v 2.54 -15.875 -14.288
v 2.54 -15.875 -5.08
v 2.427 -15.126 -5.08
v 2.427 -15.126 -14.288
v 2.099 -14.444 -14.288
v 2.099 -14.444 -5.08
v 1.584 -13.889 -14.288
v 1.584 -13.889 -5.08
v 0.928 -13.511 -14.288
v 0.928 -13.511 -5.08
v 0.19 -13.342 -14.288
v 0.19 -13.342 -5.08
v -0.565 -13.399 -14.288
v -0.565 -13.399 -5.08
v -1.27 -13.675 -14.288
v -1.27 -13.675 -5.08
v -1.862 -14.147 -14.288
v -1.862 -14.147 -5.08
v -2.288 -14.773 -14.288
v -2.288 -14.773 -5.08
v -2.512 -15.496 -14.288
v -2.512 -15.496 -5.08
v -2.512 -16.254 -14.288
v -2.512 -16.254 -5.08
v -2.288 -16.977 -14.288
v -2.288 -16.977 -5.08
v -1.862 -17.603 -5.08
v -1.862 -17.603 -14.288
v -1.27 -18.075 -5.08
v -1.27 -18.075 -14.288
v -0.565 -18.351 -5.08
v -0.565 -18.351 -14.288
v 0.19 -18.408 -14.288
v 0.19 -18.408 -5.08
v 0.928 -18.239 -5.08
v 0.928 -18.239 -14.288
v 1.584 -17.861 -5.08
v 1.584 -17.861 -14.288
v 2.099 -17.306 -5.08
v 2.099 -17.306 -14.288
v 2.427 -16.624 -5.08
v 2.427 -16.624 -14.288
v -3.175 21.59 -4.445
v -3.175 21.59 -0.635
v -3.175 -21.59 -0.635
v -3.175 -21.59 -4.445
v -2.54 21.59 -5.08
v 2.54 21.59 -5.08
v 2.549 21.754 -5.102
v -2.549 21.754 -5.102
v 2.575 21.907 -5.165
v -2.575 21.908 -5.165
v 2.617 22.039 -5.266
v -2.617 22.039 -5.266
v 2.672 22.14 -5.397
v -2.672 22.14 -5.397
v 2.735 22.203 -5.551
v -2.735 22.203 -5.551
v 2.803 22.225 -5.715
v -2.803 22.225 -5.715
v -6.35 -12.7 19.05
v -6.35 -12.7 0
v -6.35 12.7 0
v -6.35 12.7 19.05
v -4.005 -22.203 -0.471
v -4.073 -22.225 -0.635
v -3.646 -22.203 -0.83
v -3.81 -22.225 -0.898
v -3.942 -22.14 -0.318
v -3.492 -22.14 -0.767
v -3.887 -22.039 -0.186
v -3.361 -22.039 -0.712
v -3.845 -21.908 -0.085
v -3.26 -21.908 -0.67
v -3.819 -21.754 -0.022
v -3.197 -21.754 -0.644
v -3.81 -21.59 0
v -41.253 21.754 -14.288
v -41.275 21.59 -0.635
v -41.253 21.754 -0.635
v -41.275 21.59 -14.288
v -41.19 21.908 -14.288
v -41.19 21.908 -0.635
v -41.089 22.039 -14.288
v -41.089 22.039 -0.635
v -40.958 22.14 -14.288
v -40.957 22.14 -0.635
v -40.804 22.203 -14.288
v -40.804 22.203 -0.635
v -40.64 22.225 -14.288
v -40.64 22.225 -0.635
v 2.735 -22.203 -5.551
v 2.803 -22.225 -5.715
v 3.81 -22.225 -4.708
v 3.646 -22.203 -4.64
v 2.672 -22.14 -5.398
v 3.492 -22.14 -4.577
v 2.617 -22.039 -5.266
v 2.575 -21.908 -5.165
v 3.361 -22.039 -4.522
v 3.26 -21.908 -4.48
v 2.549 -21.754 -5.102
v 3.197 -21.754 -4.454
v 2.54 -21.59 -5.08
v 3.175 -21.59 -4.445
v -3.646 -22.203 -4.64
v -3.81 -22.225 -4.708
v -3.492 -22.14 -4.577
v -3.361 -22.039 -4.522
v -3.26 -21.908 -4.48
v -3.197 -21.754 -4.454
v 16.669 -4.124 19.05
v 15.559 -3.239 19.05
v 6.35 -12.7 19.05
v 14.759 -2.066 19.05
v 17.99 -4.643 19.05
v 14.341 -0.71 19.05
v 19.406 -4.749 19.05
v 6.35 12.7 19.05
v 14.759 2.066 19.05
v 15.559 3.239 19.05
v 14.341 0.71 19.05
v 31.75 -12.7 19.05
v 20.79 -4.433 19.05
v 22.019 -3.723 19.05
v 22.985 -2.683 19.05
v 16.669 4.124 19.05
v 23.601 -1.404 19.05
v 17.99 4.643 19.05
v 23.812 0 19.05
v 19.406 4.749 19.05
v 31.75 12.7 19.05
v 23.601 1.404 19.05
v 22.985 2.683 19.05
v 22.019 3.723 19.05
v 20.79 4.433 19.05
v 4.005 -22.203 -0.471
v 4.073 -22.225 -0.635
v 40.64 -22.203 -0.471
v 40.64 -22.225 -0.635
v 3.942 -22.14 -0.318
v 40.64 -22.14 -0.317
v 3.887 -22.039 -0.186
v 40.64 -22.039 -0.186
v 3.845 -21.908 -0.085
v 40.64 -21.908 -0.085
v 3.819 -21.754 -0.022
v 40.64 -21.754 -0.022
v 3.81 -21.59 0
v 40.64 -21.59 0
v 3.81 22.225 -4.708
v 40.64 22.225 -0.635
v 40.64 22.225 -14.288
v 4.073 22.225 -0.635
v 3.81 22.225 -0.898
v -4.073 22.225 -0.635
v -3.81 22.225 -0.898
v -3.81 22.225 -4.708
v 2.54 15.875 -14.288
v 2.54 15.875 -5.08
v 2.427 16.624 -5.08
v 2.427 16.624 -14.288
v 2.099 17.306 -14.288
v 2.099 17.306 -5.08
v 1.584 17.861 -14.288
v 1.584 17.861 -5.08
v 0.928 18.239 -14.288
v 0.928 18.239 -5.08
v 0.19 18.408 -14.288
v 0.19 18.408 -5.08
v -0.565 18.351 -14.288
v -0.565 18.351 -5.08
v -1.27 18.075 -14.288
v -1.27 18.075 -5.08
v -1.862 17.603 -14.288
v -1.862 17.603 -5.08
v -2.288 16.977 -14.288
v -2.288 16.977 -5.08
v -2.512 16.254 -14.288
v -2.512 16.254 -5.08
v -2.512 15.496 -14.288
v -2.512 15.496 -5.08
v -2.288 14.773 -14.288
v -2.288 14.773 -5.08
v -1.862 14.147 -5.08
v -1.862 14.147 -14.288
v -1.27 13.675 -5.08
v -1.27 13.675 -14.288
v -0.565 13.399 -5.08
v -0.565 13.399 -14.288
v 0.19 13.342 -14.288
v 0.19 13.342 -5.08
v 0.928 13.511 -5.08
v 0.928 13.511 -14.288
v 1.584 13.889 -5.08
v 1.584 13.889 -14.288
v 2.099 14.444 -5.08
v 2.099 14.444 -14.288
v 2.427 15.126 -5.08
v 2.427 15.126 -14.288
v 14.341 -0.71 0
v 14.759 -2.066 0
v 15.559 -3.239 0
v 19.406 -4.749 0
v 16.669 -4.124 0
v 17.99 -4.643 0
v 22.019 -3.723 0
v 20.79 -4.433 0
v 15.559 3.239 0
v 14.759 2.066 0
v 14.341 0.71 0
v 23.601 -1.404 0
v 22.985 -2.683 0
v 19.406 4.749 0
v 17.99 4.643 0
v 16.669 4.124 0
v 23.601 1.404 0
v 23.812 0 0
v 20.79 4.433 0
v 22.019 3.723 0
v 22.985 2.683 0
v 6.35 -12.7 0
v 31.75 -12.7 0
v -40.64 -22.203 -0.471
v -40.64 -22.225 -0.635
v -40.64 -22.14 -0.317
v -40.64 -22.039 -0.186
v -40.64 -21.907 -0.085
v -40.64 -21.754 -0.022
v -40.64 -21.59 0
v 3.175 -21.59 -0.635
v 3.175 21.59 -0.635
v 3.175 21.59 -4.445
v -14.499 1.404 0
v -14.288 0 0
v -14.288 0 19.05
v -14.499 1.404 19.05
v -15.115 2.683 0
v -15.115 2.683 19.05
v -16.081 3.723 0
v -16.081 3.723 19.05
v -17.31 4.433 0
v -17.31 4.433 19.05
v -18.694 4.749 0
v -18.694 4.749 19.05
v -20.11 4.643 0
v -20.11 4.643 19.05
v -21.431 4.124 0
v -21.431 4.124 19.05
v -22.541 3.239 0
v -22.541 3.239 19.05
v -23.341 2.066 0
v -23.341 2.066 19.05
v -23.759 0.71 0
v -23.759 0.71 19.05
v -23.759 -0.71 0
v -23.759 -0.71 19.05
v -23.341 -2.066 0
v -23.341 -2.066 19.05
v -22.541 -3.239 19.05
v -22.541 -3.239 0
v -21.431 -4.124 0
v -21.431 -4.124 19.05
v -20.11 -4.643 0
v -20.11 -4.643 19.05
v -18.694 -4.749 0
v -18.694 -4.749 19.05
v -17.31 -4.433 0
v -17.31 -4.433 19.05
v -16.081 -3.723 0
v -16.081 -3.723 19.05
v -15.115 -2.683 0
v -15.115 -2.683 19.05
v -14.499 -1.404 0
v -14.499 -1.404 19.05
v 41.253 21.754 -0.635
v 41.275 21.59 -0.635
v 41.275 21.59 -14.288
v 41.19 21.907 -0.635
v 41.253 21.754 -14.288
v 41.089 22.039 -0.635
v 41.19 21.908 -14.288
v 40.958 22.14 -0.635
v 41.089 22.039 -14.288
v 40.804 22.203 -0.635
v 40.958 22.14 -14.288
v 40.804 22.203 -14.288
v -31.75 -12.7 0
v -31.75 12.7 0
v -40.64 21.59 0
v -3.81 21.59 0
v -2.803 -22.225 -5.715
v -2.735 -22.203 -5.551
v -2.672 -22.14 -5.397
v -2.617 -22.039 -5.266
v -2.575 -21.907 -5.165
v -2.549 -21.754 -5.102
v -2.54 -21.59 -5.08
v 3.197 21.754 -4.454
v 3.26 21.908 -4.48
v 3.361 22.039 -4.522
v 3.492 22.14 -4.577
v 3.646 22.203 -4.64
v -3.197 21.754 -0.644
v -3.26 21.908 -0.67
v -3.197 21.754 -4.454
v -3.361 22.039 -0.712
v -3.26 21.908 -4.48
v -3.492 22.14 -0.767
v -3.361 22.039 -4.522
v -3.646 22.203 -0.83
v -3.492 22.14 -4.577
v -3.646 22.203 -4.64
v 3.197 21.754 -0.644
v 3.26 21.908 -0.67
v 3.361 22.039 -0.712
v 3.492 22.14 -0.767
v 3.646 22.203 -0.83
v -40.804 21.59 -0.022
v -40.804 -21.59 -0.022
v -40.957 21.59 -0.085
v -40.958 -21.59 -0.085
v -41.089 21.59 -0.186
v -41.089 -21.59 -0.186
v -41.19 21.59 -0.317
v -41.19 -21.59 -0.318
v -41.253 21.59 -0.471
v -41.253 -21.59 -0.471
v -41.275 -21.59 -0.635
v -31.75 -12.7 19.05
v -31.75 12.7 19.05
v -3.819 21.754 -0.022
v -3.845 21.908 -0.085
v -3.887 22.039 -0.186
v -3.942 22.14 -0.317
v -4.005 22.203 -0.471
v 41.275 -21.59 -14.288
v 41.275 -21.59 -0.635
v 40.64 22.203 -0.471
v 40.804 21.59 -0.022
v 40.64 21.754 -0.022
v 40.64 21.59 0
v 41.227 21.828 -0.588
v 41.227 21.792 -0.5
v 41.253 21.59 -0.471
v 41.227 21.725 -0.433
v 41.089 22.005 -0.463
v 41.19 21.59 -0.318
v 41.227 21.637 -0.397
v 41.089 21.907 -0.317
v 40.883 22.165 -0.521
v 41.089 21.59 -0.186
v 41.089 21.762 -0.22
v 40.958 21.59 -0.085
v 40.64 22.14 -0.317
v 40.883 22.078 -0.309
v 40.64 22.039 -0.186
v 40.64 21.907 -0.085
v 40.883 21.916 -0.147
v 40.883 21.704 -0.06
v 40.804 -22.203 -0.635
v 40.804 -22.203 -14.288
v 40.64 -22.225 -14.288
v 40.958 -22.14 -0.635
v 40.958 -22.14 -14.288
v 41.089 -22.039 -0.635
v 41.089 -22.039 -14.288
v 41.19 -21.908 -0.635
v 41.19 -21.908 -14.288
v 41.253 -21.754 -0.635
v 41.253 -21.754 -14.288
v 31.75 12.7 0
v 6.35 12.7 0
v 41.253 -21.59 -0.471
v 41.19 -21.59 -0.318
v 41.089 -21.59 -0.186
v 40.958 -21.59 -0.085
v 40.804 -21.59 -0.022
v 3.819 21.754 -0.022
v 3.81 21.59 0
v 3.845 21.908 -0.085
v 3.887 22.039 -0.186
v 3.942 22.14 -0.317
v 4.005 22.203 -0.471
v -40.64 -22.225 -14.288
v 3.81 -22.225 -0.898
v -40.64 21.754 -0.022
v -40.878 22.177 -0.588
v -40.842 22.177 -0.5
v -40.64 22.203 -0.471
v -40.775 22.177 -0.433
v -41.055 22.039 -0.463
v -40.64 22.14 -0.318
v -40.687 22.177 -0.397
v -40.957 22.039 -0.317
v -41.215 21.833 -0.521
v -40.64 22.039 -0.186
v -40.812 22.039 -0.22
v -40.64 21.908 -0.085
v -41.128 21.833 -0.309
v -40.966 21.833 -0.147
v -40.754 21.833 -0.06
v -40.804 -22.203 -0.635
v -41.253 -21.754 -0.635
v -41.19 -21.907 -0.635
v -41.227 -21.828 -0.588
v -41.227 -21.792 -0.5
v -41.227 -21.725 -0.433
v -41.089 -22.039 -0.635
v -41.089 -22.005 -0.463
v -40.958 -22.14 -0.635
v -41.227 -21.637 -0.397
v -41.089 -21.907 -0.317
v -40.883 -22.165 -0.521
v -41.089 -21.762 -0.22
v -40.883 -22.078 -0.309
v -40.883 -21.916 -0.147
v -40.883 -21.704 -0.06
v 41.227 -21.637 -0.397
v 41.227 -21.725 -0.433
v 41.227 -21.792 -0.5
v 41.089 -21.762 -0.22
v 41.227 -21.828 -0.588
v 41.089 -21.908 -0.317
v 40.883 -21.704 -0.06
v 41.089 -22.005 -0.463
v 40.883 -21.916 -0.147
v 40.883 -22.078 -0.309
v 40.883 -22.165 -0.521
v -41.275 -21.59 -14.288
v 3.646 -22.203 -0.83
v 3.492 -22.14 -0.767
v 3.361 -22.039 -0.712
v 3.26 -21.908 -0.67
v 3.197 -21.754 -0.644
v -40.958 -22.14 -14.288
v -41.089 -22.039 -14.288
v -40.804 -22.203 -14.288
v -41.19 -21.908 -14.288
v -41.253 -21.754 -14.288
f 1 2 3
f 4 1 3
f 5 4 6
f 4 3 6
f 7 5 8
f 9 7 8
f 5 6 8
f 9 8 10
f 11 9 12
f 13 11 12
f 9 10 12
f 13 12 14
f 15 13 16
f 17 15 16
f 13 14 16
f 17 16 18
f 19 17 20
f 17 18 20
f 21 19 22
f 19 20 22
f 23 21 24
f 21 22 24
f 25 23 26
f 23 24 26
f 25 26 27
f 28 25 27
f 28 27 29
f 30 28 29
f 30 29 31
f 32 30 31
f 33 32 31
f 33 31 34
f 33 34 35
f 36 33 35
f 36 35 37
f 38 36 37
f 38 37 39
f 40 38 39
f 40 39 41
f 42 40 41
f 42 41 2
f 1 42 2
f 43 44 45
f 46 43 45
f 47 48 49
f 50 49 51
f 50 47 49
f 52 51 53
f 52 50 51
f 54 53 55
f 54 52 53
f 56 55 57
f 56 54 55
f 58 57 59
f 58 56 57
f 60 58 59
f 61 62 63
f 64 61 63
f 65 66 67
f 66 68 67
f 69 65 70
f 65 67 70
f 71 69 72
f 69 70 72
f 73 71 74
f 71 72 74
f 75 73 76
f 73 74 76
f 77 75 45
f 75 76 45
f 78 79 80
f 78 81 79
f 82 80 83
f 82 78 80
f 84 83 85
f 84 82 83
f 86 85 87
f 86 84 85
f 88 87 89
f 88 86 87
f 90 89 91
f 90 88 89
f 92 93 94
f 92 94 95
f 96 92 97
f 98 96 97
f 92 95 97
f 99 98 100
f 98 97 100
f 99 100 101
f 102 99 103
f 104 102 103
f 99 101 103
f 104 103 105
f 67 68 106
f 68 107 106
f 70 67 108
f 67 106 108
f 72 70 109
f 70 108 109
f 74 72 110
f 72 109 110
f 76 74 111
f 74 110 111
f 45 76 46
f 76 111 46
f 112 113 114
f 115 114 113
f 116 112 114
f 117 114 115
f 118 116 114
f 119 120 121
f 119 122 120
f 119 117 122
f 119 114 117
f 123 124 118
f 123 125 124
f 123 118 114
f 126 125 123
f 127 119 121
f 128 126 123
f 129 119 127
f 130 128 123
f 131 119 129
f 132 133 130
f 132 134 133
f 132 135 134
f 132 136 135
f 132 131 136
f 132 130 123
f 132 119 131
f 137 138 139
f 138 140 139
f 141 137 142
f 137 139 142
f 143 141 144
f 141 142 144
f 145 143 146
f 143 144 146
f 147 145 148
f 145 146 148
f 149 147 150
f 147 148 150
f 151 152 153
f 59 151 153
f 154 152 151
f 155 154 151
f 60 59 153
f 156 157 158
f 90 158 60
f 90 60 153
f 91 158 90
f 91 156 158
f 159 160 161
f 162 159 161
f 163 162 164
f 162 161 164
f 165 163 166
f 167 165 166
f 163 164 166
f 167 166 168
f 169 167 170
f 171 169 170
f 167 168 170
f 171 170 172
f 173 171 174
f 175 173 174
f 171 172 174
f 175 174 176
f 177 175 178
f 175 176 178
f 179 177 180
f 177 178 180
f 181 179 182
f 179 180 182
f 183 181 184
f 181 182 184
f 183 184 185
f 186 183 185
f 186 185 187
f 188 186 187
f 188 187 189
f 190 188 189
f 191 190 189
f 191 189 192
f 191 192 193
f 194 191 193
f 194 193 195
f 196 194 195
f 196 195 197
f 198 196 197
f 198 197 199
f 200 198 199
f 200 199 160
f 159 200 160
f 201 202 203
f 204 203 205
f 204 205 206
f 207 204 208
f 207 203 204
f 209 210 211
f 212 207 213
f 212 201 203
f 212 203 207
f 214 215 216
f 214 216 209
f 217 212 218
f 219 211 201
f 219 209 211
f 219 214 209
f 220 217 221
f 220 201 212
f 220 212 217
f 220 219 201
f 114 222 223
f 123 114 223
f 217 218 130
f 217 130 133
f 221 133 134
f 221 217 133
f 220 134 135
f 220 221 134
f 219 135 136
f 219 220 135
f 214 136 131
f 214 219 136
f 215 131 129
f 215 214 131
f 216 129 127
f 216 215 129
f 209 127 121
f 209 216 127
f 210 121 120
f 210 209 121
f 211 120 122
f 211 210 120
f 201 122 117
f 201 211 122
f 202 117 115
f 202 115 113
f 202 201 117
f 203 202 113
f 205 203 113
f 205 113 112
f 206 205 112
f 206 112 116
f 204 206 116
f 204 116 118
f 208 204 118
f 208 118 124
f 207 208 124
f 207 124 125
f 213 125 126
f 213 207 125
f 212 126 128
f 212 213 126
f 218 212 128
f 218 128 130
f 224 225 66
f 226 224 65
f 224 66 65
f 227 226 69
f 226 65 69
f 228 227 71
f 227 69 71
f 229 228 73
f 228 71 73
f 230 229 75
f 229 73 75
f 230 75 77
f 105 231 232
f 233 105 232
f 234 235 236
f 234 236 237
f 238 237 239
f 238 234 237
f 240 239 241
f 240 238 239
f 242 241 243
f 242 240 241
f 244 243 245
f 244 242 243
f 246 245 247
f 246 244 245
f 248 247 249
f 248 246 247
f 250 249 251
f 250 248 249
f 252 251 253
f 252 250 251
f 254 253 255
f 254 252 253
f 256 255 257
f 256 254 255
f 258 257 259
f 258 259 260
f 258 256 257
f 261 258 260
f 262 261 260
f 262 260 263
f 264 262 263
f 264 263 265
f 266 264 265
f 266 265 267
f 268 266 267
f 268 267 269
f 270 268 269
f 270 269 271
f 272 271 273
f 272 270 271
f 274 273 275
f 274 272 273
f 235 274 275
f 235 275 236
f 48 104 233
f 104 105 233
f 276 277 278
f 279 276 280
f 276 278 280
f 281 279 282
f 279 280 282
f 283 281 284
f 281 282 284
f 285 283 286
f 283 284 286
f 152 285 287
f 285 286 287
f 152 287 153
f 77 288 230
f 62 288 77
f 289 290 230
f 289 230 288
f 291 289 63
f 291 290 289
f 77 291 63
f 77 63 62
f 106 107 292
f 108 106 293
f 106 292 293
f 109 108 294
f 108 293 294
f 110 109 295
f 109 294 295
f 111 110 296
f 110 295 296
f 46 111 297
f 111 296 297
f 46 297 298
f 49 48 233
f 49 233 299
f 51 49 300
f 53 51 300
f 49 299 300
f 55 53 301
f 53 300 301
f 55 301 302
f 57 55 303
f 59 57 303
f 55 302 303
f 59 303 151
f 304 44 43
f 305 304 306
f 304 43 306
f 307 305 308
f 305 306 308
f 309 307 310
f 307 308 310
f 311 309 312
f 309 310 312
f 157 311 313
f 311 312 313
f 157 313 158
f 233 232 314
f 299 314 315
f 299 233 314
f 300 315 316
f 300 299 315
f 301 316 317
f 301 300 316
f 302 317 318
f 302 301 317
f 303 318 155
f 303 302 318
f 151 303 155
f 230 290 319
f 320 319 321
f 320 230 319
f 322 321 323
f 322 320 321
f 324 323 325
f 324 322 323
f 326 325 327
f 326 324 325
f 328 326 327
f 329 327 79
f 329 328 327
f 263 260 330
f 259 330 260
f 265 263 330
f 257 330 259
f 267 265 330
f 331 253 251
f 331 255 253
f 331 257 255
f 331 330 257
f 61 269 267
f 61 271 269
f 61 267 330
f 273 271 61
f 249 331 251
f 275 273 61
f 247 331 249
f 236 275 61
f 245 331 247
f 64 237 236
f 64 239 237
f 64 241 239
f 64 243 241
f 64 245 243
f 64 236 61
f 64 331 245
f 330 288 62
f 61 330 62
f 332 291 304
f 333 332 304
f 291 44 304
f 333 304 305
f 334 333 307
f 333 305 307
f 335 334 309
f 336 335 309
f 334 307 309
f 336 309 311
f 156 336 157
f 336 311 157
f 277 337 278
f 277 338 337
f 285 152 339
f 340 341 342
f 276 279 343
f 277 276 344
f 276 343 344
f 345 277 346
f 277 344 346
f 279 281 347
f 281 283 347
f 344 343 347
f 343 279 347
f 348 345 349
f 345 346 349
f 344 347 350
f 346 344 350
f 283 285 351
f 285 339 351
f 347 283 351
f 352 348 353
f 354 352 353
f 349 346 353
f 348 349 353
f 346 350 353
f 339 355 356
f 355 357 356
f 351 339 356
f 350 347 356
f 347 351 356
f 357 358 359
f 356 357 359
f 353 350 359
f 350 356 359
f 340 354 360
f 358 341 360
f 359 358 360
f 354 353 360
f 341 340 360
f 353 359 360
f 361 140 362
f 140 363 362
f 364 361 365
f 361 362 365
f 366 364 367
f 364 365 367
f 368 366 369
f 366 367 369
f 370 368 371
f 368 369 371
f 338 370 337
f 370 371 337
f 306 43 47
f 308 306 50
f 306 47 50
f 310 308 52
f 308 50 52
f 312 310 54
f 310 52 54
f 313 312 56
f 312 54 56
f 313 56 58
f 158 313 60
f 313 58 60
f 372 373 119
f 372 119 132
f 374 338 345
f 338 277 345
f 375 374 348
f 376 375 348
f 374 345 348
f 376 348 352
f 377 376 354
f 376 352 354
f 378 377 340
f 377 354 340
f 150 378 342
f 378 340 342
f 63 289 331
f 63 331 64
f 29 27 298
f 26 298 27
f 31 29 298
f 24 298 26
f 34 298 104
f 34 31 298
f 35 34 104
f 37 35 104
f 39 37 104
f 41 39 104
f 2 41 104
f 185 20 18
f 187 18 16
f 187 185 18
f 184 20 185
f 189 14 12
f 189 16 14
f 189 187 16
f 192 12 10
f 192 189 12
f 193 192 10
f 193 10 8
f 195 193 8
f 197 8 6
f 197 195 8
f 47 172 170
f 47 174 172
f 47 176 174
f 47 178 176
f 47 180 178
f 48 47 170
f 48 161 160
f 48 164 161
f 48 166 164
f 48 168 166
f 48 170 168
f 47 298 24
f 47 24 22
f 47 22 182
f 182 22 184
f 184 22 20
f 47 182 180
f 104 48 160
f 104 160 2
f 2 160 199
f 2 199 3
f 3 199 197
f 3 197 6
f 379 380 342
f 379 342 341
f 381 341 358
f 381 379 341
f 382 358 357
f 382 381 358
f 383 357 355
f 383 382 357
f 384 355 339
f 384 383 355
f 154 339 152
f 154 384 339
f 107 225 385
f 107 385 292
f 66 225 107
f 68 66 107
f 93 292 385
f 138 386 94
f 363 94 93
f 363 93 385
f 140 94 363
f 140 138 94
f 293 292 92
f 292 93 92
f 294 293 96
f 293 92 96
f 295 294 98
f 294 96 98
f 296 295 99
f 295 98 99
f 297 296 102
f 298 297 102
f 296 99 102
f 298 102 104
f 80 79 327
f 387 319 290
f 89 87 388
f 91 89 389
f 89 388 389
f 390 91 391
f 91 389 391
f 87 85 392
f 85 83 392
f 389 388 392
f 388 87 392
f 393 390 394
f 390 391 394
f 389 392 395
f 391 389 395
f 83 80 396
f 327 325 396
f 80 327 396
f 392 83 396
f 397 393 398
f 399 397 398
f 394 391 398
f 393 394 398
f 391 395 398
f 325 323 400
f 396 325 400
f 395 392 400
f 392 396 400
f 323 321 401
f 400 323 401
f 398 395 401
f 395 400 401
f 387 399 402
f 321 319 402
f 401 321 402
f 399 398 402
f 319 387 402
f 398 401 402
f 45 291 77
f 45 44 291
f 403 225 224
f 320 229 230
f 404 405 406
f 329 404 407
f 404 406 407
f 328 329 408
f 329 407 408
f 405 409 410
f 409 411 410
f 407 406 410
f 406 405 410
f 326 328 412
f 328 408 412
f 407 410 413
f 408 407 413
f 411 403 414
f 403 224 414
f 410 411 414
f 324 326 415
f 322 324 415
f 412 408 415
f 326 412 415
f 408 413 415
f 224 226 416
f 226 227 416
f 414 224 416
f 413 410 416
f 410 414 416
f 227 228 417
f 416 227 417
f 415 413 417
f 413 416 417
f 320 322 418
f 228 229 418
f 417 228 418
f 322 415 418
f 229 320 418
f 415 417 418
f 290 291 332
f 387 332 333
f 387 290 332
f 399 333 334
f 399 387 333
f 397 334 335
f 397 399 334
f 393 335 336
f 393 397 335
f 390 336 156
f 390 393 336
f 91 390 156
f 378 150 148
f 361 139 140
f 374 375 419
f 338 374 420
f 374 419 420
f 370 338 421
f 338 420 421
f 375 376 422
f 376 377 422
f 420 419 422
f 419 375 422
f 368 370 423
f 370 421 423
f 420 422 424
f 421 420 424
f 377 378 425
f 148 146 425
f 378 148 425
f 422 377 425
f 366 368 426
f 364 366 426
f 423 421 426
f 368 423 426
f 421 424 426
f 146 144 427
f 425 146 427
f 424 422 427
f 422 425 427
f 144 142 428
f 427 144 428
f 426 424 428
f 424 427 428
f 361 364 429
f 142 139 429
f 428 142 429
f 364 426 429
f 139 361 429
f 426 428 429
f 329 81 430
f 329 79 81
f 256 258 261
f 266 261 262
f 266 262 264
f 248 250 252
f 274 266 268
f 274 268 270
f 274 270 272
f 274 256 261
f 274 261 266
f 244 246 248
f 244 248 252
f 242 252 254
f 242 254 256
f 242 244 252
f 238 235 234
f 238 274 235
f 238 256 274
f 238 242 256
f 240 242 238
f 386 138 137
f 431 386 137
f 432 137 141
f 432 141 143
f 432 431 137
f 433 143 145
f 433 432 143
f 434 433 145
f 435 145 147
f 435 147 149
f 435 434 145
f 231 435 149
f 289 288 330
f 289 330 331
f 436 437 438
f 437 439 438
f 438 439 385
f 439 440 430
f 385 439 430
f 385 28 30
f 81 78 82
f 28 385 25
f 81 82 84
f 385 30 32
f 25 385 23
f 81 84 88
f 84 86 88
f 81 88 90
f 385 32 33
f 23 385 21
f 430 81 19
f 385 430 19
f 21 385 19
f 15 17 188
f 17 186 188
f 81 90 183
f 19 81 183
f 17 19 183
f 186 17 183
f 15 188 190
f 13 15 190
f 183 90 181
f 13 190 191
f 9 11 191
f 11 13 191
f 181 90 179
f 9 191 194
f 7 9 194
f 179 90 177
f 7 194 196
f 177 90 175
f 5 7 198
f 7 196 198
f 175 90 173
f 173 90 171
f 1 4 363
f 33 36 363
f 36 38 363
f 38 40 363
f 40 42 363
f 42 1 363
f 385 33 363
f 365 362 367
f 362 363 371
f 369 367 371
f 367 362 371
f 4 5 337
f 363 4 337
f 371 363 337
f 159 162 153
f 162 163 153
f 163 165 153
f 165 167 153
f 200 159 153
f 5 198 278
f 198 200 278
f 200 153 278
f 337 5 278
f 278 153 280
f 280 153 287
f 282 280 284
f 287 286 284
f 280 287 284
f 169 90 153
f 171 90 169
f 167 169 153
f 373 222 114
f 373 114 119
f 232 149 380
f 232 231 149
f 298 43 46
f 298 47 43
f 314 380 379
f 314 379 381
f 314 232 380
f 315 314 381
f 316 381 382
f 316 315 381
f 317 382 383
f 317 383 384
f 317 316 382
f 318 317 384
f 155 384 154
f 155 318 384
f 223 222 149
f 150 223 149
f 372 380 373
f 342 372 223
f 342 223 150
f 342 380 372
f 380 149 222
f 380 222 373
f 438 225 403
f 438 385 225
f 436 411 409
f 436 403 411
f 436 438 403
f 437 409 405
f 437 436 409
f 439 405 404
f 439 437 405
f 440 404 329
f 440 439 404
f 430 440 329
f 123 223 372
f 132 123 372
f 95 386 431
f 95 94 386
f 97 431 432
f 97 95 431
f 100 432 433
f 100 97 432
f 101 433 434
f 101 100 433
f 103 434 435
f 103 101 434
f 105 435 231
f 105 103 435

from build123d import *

# Parameters (mm, degrees)
F0_W     = 25.4
F0_H     = 25.4
F0_R     = 4.7625
F0_W_2   = 3.175
F0_W_3   = 6.35
F0_R_2   = 2.54
F1_DEPTH = 14.2875
F2_DEPTH = 19.05
F3_DEPTH = 5.08
F4_DEPTH = 14.2875
F5_SIZE  = 0.63499
F6_R     = 0.635


# Not quite as in the source:
# - a fillet or chamfer is up to 0.001 mm smaller than in the source, because OpenCascade refuses the exact size
# - a feature names something its author has since deleted; it is built from what else it names


with BuildPart() as f1:
    # F0 (on Top) → F1 (new body)
    with BuildSketch(Plane.XY):
        Polygon((-6.35, 12.7), (-3.175, 12.7), (-3.175, 22.225), (-41.275, 22.225), (-41.275, -22.225), (-3.175, -22.225), (-3.175, -12.7), (-6.35, -12.7), (-31.75, -12.7), (-31.75, 12.7), align=None)
        with Locations((-19.05, 0)):
            Rectangle(F0_W, F0_H)
        with Locations((-19.05, 0)):
            Circle(F0_R, mode=Mode.SUBTRACT)
        with Locations((-4.7625, 0)):
            Rectangle(F0_W_2, F0_H)
        Rectangle(F0_W_3, F0_H)
        Polygon((3.175, 12.7), (3.175, 22.225), (2.54, 22.225), (-2.54, 22.225), (-3.175, 22.225), (-3.175, 12.7), align=None)
        with Locations((0, 15.875)):
            Circle(F0_R_2, mode=Mode.SUBTRACT)
        Polygon((2.54, -22.225), (3.175, -22.225), (3.175, -12.7), (-3.175, -12.7), (-3.175, -22.225), (-2.54, -22.225), align=None)
        with Locations((0, -15.875)):
            Circle(F0_R_2, mode=Mode.SUBTRACT)
        Polygon((41.275, -22.225), (41.275, 22.225), (3.175, 22.225), (3.175, 12.7), (6.35, 12.7), (31.75, 12.7), (31.75, -12.7), (6.35, -12.7), (3.175, -12.7), (3.175, -22.225), align=None)
        with Locations((4.7625, 0)):
            Rectangle(F0_W_2, F0_H)
        with Locations((19.05, 0)):
            Rectangle(F0_W, F0_H)
        with Locations((19.05, 0)):
            Circle(F0_R, mode=Mode.SUBTRACT)
        with Locations((19.05, 0)):
            Circle(F0_R)
        with Locations((-19.05, 0)):
            Circle(F0_R)
    extrude(amount=-F1_DEPTH)

    # F0 (on Top) → F2 (join)
    with BuildSketch(Plane.XY):
        with Locations((-19.05, 0)):
            Rectangle(F0_W, F0_H)
        with Locations((-19.05, 0)):
            Circle(F0_R, mode=Mode.SUBTRACT)
        with Locations((19.05, 0)):
            Rectangle(F0_W, F0_H)
        with Locations((19.05, 0)):
            Circle(F0_R, mode=Mode.SUBTRACT)
    extrude(amount=F2_DEPTH)

    # F0 (on Top) → F3 (cut)
    with BuildSketch(Plane.XY):
        Rectangle(F0_W_3, F0_H)
        Polygon((2.54, -22.225), (3.175, -22.225), (3.175, -12.7), (-3.175, -12.7), (-3.175, -22.225), (-2.54, -22.225), align=None)
        with Locations((0, -15.875)):
            Circle(F0_R_2, mode=Mode.SUBTRACT)
        Polygon((3.175, 12.7), (3.175, 22.225), (2.54, 22.225), (-2.54, 22.225), (-3.175, 22.225), (-3.175, 12.7), align=None)
        with Locations((0, 15.875)):
            Circle(F0_R_2, mode=Mode.SUBTRACT)
    extrude(amount=-F3_DEPTH, mode=Mode.SUBTRACT)

    # F0 (on Top) → F4 (cut)
    with BuildSketch(Plane.XY):
        with Locations((0, -15.875)):
            Circle(F0_R_2)
        with Locations((0, 15.875)):
            Circle(F0_R_2)
    extrude(amount=-F4_DEPTH, mode=Mode.SUBTRACT)

    # F5 (size 0.635 in the source; OpenCascade refuses exactly that, so slightly less here)
    f5_edges = [f1.edges().sort_by_distance(p)[0] for p in [
        (3.175, 0, -5.08),
        (-3.175, 0, -5.08),
        (3.175, 0, 0),
        (-3.175, 0, 0),
    ]]
    chamfer(f5_edges, length=F5_SIZE)

    # F6
    f6_edges = [f1.edges().sort_by_distance(p)[0] for p in [
        (-22.542495, -22.225, 0),
        (-3.492495, -22.225, -0.317495),
        (-2.857505, -22.225, -4.762505),
        (0, -22.225, -5.08),
        (2.857505, -22.225, -4.762505),
        (3.175, -22.225, -2.54),
        (3.492495, -22.225, -0.317495),
        (22.542495, -22.225, 0),
        (-41.275, -22.225, -7.14375),
        (-41.275, 0, 0),
        (-41.275, 22.225, -7.14375),
        (-22.542495, 22.225, 0),
        (-3.175, 22.225, -2.54),
        (-3.492495, 22.225, -0.317495),
        (0, 22.225, -5.08),
        (-2.857505, 22.225, -4.762505),
        (22.542495, 22.225, 0),
        (3.175, 22.225, -2.54),
        (3.492495, 22.225, -0.317495),
        (41.275, 22.225, -7.14375),
        (41.275, 0, 0),
        (41.275, -22.225, -7.14375),
        (2.857505, 22.225, -4.762505),
        (-3.175, -22.225, -2.54),
    ]]
    fillet(f6_edges, radius=F6_R)


solid = f1.part
